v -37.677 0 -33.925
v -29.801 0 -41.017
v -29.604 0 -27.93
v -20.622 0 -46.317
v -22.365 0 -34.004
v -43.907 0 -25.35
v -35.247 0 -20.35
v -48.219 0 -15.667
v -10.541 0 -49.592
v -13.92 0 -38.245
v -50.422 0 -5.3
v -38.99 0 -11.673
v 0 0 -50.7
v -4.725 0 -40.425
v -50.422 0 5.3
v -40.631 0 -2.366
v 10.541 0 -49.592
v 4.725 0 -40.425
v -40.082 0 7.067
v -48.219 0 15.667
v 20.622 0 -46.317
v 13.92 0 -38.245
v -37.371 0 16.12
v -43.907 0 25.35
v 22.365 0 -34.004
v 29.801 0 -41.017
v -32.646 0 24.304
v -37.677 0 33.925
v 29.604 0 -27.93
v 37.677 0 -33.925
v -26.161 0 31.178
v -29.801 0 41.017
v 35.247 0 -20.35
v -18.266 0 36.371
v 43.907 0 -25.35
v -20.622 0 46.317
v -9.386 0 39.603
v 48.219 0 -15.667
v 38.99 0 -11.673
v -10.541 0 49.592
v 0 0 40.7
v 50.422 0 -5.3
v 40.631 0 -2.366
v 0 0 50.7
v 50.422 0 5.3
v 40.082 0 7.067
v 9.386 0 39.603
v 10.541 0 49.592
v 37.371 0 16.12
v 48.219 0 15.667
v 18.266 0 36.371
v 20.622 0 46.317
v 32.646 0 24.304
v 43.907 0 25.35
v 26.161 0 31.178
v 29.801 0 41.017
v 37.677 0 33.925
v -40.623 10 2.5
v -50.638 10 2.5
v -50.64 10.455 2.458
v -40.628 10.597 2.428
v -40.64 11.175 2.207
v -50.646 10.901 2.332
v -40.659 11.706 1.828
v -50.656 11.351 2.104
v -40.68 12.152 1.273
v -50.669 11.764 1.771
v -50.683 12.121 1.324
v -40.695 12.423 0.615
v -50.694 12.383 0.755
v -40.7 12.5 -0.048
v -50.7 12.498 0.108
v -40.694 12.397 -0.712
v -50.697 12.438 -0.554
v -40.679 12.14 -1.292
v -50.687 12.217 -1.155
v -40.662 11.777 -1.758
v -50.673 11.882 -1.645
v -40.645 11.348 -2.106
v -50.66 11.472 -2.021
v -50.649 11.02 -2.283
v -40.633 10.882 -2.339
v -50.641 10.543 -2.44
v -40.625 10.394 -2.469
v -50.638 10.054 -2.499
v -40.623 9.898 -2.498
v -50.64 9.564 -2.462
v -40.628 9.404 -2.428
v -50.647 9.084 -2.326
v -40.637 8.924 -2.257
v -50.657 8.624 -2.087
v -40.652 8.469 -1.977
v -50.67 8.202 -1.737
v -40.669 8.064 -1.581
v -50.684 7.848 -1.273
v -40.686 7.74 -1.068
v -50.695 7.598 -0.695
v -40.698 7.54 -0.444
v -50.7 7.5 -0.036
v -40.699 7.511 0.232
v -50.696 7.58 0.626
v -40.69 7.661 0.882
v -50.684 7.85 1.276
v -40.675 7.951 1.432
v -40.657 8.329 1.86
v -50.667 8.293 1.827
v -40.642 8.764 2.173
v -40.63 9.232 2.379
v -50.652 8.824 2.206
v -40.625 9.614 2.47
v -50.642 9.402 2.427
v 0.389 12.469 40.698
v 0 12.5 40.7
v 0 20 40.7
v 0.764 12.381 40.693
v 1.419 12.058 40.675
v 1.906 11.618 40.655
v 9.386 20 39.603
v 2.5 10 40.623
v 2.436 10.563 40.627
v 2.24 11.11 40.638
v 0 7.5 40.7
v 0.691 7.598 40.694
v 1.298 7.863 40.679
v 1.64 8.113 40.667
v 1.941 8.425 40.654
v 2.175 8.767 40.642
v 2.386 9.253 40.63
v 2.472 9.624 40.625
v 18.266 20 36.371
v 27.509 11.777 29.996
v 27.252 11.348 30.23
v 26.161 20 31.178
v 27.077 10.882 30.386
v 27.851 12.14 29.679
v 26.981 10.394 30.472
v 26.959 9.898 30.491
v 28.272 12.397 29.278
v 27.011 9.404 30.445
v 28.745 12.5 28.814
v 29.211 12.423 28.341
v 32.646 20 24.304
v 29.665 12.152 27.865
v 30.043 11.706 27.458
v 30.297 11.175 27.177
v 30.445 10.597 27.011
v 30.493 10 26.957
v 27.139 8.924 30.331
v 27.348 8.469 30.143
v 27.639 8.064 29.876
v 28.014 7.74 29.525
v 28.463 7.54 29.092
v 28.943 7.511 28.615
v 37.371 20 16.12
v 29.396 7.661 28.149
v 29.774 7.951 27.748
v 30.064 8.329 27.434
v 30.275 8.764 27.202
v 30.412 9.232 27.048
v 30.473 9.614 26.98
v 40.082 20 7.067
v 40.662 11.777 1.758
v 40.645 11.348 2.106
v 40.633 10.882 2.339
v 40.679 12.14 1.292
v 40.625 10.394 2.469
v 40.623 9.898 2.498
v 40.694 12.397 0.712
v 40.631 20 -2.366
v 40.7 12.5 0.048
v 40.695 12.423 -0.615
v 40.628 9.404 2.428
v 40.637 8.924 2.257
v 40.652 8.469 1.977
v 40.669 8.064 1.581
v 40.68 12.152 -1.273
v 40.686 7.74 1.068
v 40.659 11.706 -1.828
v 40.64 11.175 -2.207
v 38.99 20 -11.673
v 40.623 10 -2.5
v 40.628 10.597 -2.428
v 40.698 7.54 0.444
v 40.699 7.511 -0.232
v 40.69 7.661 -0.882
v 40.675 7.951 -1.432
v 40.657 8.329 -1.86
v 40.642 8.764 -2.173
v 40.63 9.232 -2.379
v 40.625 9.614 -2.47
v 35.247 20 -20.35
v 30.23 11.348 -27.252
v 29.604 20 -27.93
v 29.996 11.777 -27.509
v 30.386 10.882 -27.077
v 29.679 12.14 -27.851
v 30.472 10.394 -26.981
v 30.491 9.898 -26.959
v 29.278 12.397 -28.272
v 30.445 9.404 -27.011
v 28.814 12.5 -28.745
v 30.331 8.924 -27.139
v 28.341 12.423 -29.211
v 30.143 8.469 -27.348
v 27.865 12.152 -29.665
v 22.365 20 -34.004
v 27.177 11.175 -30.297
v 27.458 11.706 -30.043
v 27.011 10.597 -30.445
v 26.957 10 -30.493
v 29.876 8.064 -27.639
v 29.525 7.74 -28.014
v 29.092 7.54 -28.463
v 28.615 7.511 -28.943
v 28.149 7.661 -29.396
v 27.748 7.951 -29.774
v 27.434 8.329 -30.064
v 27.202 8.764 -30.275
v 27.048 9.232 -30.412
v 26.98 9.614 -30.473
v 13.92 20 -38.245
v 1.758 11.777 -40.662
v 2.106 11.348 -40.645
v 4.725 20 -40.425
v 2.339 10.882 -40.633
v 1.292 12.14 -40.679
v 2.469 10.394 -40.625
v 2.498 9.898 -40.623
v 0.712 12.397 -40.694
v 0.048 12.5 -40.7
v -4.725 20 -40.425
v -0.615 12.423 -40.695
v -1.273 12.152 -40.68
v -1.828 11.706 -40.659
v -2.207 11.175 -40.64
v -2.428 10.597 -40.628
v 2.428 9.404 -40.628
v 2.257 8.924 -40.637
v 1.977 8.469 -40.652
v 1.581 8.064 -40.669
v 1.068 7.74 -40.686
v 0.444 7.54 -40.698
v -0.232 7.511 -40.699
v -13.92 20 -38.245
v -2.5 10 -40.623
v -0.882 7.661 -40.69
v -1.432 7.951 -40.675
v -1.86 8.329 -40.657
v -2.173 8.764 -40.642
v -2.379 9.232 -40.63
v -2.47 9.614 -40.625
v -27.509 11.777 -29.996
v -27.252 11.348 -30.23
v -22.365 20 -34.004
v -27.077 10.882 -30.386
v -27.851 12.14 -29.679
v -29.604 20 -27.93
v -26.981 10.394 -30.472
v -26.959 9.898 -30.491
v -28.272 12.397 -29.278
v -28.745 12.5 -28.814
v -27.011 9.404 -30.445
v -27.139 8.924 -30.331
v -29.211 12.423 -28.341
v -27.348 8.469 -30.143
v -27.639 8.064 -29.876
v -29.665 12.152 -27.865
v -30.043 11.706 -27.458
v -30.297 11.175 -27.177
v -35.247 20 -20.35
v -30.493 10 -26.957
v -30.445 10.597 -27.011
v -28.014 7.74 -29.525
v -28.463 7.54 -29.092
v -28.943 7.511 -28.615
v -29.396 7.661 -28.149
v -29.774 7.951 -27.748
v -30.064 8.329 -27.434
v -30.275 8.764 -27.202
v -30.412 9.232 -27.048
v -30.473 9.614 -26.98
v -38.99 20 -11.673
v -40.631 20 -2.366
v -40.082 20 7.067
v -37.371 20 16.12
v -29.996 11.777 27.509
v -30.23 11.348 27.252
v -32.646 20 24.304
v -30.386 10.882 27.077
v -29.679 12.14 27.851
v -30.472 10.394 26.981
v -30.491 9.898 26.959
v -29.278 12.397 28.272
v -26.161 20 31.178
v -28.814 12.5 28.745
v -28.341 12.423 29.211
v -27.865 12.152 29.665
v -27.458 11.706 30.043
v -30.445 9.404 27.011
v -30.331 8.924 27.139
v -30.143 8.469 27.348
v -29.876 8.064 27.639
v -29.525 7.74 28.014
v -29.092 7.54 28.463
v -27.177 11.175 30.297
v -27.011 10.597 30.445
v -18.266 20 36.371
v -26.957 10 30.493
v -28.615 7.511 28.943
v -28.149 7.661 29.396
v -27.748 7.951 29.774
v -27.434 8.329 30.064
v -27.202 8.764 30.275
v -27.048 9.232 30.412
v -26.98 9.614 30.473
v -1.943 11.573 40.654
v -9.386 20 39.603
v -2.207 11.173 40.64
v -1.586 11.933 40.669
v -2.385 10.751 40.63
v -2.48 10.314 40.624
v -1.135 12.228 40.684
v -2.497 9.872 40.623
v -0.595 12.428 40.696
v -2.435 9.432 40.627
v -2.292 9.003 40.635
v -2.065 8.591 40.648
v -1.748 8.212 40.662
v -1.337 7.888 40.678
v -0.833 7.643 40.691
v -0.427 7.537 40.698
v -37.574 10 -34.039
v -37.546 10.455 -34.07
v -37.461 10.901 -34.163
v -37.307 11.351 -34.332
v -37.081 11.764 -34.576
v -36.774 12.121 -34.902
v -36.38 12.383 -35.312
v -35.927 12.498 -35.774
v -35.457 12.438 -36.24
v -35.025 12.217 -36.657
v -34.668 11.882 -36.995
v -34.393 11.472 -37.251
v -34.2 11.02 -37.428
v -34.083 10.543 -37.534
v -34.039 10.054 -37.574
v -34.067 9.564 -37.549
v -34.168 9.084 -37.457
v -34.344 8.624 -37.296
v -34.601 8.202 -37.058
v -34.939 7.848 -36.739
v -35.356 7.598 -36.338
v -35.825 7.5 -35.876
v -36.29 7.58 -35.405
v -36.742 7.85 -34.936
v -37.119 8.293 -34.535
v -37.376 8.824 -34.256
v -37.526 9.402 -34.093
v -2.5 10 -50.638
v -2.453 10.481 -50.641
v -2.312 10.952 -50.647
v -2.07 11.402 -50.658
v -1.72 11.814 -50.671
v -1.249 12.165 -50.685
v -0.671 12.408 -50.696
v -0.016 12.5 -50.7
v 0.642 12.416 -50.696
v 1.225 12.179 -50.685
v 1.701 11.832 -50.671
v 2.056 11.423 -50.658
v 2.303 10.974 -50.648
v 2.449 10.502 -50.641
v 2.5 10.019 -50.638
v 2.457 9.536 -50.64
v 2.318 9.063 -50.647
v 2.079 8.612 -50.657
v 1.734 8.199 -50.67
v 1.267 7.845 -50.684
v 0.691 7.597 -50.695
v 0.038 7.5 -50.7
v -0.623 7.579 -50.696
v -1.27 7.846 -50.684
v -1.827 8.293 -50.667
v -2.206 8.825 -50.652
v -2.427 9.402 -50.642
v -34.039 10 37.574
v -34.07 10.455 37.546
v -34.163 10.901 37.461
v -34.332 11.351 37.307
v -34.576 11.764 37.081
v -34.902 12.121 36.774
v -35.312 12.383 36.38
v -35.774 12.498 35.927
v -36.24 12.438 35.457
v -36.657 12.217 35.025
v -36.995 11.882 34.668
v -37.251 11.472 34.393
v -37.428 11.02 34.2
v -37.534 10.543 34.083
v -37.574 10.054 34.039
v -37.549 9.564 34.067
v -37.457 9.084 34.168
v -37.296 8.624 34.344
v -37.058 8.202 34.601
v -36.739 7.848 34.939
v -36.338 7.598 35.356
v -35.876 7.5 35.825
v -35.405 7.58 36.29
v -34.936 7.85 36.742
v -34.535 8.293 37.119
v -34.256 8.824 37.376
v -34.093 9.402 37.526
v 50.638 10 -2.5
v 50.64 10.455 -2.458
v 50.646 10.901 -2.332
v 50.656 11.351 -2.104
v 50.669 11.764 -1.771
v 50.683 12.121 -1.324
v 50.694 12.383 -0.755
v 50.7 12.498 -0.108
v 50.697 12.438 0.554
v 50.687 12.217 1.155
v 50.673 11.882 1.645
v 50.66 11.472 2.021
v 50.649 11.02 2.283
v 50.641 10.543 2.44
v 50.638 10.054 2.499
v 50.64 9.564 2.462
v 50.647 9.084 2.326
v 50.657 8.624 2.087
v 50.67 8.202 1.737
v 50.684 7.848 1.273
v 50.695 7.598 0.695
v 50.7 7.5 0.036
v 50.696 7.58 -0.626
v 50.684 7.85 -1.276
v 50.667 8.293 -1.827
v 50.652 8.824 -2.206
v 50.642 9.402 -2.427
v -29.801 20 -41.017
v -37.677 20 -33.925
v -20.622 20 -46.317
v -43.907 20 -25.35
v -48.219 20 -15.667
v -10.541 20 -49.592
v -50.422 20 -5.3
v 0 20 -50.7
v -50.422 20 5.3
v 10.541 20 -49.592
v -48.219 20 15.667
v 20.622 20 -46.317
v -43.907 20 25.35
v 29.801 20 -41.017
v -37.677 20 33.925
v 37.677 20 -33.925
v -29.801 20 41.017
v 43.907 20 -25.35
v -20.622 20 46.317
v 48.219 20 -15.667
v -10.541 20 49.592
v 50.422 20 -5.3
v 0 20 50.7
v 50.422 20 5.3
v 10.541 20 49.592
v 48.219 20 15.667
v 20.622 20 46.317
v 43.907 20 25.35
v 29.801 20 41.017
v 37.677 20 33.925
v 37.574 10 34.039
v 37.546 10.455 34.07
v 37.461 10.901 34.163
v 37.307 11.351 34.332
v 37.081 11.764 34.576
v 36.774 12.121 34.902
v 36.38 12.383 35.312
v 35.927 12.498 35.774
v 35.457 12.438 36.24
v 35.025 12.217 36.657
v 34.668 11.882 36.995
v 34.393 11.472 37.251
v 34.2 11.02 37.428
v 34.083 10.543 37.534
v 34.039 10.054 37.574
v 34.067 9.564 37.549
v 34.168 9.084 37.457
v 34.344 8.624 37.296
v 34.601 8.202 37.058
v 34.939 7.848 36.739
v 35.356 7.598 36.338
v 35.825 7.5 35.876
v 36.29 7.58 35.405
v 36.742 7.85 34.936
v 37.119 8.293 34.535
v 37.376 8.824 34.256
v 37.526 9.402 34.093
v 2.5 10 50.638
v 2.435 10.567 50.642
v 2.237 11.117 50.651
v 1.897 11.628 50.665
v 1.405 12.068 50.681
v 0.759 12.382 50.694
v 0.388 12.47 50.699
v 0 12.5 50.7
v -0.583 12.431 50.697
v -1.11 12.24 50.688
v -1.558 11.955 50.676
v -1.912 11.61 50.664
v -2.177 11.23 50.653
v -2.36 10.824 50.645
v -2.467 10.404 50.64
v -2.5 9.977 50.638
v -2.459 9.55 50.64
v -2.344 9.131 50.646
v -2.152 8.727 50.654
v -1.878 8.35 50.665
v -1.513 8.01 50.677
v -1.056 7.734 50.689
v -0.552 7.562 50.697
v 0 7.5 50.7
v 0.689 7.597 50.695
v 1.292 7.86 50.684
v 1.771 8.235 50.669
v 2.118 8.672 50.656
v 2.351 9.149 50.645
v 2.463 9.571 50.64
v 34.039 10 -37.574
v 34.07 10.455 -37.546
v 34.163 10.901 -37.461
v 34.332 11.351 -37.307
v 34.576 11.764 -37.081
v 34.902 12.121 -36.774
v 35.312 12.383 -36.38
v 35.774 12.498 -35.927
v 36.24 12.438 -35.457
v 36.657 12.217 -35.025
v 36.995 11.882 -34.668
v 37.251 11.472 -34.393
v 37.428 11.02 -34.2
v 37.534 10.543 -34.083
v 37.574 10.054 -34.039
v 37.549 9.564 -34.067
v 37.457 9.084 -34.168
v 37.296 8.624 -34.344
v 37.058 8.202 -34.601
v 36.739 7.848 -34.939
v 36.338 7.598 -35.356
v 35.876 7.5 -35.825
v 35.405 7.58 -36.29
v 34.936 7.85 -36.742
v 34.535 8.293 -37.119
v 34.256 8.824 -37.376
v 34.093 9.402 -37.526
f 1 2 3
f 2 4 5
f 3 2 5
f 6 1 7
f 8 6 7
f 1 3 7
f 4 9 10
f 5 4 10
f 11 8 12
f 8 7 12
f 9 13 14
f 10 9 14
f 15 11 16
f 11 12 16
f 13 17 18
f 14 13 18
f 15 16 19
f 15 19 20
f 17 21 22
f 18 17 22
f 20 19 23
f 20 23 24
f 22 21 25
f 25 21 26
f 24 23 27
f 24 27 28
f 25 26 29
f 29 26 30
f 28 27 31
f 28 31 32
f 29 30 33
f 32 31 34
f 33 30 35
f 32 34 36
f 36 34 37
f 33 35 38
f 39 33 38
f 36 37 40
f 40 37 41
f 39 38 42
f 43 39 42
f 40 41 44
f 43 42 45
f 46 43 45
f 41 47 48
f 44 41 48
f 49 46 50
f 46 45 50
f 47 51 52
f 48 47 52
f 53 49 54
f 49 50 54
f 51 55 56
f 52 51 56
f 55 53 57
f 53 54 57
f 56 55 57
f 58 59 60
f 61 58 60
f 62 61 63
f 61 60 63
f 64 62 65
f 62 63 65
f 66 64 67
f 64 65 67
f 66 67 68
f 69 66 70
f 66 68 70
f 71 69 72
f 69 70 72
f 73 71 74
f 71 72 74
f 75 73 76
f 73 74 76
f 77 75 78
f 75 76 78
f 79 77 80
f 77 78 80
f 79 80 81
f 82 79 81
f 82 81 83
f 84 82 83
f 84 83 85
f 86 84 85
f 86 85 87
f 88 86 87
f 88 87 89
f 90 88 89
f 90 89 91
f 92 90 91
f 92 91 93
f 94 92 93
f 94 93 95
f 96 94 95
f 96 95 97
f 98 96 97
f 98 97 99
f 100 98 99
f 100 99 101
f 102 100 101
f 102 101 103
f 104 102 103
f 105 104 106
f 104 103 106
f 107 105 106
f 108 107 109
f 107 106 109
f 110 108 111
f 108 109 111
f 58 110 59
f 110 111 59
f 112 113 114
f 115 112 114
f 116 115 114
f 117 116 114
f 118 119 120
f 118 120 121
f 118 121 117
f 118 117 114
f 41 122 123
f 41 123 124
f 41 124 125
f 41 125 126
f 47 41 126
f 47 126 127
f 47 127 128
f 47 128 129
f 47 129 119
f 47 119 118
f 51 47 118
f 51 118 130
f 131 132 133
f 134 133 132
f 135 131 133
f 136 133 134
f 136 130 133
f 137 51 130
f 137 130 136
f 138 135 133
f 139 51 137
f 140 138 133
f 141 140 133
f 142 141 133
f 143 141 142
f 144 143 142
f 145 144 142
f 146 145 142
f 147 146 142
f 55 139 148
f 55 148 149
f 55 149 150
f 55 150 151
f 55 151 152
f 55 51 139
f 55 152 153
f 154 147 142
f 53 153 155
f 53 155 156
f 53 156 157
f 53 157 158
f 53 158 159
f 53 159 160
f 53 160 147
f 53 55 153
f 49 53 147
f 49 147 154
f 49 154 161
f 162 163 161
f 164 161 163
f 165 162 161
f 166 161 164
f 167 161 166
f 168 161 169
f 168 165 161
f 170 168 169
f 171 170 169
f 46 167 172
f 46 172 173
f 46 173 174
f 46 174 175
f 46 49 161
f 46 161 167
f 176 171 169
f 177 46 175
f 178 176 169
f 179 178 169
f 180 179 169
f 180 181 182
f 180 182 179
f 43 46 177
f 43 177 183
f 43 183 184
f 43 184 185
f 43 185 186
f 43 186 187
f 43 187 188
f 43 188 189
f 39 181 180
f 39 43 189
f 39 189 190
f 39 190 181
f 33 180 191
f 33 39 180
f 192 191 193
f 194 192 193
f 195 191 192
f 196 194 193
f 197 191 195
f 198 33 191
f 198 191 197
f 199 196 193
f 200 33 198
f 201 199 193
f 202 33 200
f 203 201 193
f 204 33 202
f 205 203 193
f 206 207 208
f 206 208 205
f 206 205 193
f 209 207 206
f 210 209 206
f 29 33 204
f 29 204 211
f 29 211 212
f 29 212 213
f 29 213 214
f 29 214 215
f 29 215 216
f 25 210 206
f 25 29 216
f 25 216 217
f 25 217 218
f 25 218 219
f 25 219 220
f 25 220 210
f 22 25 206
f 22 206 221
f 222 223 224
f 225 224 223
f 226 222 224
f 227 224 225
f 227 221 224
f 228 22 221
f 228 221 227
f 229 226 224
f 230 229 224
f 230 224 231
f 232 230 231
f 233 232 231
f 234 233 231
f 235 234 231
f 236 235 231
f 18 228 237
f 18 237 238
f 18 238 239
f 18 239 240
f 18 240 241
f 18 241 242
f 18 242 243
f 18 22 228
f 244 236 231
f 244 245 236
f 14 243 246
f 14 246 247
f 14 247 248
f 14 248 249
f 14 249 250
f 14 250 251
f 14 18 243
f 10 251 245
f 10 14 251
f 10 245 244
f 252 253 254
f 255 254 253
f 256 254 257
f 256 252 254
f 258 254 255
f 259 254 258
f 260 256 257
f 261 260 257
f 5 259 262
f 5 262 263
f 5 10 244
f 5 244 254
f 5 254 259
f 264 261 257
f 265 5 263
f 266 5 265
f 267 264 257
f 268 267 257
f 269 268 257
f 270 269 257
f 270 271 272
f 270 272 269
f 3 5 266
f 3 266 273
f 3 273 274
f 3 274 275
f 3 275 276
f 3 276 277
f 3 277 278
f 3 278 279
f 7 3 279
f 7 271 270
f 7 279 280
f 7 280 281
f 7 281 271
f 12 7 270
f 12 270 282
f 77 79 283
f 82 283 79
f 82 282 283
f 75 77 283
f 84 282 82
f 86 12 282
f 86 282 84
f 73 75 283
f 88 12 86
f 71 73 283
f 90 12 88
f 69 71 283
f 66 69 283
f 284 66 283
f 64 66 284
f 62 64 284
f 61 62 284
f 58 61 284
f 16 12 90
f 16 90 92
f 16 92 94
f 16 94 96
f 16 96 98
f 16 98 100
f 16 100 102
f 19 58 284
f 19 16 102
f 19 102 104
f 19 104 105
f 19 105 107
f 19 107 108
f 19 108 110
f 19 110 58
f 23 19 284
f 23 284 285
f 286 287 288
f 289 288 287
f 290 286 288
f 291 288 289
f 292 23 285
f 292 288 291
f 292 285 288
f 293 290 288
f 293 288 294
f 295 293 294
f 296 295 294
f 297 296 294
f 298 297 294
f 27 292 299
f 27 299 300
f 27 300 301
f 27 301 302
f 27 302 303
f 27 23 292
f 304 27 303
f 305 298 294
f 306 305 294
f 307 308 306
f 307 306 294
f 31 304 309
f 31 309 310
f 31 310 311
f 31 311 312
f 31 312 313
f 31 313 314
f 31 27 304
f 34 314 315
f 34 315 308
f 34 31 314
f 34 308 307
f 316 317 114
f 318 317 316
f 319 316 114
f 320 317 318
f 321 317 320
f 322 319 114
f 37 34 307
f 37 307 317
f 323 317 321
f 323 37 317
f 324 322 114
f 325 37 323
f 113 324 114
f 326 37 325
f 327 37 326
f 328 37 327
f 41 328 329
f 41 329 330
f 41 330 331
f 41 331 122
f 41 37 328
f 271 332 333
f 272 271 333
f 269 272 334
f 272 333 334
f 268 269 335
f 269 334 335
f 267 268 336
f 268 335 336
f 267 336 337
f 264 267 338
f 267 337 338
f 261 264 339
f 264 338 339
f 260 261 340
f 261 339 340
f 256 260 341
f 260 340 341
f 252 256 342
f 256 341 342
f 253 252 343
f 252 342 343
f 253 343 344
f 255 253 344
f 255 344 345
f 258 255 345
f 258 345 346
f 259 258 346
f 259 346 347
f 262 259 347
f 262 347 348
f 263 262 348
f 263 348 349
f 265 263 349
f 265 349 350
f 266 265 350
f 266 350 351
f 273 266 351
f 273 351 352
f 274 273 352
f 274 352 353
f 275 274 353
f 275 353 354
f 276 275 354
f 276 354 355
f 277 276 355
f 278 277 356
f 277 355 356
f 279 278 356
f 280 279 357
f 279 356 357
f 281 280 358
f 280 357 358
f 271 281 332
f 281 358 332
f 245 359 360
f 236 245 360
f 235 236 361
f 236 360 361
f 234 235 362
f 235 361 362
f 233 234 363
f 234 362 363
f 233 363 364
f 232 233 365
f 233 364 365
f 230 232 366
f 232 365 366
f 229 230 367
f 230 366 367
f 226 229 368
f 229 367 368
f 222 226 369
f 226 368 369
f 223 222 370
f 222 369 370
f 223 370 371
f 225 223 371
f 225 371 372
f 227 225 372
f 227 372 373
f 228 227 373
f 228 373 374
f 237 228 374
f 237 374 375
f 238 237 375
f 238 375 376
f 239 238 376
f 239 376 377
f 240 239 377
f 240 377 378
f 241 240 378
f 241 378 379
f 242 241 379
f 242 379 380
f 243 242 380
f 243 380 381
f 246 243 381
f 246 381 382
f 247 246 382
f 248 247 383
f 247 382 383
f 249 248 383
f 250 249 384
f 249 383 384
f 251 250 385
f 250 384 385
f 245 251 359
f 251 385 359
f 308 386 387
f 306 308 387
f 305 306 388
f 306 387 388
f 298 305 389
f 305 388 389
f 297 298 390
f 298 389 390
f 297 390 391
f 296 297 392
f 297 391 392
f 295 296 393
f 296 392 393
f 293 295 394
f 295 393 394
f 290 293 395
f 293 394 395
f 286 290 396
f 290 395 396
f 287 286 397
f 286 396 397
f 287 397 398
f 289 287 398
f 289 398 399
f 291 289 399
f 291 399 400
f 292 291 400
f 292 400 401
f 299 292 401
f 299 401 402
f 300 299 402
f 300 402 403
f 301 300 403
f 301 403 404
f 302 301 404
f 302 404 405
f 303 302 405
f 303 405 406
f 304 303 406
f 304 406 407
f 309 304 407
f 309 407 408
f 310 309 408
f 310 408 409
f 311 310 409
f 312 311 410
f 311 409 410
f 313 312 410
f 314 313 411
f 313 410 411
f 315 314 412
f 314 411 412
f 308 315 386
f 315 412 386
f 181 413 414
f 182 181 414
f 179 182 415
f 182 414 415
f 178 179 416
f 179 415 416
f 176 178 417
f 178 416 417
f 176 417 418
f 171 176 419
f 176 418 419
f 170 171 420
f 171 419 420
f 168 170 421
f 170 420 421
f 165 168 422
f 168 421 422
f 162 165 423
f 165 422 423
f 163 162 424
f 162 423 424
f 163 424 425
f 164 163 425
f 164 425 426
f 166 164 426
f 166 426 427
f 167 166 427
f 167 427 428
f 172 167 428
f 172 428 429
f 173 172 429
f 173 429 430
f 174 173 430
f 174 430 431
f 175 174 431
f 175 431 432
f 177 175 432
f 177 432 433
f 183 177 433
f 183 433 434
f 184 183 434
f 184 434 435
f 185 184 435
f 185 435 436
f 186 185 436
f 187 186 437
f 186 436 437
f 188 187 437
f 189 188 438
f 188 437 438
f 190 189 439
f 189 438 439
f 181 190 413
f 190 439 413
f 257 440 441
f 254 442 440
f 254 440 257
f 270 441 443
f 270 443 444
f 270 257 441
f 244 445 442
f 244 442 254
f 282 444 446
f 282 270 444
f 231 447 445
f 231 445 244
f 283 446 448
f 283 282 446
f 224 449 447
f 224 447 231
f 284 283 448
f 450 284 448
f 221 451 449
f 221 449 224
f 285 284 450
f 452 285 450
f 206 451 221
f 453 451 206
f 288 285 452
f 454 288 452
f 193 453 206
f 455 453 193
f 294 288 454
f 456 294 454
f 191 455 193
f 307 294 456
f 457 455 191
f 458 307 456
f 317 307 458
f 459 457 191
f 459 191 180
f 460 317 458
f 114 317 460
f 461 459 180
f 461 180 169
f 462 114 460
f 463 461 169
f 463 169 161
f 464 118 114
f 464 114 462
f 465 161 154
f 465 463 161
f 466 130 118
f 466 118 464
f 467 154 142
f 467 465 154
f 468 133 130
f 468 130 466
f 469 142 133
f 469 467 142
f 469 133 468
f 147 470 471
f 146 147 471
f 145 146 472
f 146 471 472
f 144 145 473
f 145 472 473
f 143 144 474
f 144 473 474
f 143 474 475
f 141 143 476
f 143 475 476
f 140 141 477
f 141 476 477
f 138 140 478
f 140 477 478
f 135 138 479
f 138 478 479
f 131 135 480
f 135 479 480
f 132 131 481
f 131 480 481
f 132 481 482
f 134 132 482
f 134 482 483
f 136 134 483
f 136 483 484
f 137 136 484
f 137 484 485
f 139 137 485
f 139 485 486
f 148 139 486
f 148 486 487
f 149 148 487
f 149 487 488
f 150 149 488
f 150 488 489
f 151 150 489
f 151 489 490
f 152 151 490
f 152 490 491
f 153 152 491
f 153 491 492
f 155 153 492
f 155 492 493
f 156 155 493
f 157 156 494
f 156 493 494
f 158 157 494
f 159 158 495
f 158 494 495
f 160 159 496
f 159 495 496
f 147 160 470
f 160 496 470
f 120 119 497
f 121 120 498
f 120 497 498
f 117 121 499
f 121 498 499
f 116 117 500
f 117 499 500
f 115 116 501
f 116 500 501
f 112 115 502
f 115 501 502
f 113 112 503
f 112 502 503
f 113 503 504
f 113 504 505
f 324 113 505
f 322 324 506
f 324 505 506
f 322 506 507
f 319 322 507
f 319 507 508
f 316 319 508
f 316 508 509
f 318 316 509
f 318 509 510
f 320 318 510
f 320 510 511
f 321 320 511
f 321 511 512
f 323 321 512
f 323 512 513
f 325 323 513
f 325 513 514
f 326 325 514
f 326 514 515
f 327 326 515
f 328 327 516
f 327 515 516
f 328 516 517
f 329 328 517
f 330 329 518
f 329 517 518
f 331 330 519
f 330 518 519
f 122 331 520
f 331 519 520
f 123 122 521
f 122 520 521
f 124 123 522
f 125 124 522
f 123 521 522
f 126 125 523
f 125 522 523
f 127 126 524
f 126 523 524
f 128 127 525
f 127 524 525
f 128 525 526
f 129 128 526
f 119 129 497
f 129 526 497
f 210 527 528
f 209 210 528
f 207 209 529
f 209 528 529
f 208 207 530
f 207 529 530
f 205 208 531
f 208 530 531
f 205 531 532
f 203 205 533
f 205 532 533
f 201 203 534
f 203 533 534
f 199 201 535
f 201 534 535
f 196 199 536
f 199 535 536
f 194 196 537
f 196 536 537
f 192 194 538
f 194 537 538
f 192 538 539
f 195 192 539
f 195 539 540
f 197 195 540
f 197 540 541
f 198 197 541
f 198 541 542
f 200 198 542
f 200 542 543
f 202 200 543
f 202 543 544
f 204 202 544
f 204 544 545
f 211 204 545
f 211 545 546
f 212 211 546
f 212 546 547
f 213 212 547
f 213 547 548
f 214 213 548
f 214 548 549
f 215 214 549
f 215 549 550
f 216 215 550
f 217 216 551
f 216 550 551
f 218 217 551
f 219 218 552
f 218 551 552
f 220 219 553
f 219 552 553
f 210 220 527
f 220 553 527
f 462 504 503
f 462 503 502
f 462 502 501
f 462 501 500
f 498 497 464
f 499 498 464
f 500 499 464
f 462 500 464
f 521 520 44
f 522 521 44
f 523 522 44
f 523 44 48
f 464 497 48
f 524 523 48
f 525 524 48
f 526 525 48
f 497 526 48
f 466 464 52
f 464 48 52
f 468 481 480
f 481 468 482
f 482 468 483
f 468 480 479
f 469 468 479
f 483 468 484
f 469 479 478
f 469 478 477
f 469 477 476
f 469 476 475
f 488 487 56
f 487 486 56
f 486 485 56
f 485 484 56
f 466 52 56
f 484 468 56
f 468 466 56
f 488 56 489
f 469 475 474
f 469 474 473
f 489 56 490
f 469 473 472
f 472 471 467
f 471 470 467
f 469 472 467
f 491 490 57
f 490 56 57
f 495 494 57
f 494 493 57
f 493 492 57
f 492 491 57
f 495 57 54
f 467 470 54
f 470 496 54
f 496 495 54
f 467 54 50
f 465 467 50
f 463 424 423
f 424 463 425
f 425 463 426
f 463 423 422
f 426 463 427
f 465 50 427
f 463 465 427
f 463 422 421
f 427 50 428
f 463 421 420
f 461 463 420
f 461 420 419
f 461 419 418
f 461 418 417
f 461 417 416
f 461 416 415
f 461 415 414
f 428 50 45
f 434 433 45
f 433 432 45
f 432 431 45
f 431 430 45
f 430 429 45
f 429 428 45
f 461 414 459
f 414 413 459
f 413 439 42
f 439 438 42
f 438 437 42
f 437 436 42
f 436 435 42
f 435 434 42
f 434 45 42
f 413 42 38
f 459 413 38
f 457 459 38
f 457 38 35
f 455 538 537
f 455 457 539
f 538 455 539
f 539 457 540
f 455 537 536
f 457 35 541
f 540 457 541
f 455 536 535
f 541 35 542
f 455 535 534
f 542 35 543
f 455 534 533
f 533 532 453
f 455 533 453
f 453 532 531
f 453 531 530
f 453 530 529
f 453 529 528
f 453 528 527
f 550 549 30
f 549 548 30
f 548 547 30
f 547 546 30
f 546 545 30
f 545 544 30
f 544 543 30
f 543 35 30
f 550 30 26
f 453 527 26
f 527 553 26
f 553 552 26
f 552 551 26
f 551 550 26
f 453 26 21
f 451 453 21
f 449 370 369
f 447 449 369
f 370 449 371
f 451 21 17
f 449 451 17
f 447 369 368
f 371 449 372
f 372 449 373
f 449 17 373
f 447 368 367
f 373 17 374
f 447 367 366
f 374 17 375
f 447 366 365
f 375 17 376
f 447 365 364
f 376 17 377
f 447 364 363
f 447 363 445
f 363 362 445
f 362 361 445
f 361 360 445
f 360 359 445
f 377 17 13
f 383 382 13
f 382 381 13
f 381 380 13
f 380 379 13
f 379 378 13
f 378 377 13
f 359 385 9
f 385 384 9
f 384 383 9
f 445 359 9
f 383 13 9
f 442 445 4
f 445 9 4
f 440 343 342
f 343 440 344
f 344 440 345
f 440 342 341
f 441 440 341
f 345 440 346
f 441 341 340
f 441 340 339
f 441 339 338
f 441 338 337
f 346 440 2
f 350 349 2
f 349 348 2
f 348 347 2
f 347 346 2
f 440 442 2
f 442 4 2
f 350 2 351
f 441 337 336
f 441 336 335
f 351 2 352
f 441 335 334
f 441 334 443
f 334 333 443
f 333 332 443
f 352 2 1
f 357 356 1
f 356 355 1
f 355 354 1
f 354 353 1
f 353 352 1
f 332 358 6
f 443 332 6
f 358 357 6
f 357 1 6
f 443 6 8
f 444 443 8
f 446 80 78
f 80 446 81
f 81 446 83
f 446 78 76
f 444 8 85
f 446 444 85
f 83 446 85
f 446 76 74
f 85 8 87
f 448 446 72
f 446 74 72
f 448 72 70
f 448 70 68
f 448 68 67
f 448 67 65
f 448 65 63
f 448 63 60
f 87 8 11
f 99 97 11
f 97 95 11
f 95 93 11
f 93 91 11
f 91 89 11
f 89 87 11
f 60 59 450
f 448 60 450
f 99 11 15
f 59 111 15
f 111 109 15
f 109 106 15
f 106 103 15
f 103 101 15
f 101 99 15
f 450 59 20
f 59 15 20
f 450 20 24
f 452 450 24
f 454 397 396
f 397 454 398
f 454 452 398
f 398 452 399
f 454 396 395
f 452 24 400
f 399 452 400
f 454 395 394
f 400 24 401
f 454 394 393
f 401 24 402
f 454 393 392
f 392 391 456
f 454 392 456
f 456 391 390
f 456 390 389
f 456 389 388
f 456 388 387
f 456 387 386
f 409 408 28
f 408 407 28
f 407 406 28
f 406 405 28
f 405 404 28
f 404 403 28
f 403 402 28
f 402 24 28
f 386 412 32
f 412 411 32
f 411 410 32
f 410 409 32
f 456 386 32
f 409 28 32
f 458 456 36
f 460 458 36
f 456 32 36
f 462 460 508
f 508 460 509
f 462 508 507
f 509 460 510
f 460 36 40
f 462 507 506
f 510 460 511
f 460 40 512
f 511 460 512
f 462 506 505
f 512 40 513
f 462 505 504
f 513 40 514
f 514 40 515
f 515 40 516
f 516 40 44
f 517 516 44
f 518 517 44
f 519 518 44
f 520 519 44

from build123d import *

# Parameters (mm, degrees)
SKETCH3_R               = 50.7
SKETCH3_R_2             = 40.700000007
BOSS_EXTRUDE1_DEPTH     = 20
CUT_EXTRUDE1_REACH      = 117.119
CUT_EXTRUDE1_END_RADIUS = 40.700000007
SKETCH5_R               = 2.5
CIRPATTERN1_COUNT       = 8


with BuildPart() as part:
    # Sketch3 → Boss-Extrude1 (new body)
    with BuildSketch(Plane(origin=(0, 0, 0), x_dir=(1, 0, 0), z_dir=(0, 1, 0))):
        with Locations(Location((0, 0, 0), (0, 0, 270))):
            Circle(SKETCH3_R)
        with Locations(Location((0, 0, 0), (0, 0, 270))):
            Circle(SKETCH3_R_2, mode=Mode.SUBTRACT)
    extrude(amount=BOSS_EXTRUDE1_DEPTH)

    # Cut-Extrude1: up to this cylinder (the profile starts outside it)
    cut_extrude1_end = Plane(origin=(0, 10, 0), z_dir=(0, -1, 0)) * Cylinder(CUT_EXTRUDE1_END_RADIUS, 316.638000014, mode=Mode.PRIVATE)
    # Sketch5 → Cut-Extrude1 (cut, up to the surface)
    with BuildSketch(Plane(origin=(50.7, 0, 0), x_dir=(0, 0, -1), z_dir=(1, 0, 0)), mode=Mode.PRIVATE) as cut_extrude1_sk1:
        with Locations((0, 10)):
            Circle(SKETCH5_R)
    cut_extrude1_tool1 = extrude(cut_extrude1_sk1.sketch, amount=-CUT_EXTRUDE1_REACH, mode=Mode.PRIVATE) - cut_extrude1_end
    cut_extrude1 = cut_extrude1_tool1.solids().sort_by_distance((50.7, 10, 0))[0]
    add(cut_extrude1, mode=Mode.SUBTRACT)

    # CirPattern1: Cut-Extrude1 ×8 about axis
    cirpattern1_axis = Axis((0, 20, 0), (0, -1, 0))
    for i in range(1, CIRPATTERN1_COUNT):
        add(cut_extrude1.rotate(cirpattern1_axis, i * 360 / CIRPATTERN1_COUNT), mode=Mode.SUBTRACT)


solid = part.part
